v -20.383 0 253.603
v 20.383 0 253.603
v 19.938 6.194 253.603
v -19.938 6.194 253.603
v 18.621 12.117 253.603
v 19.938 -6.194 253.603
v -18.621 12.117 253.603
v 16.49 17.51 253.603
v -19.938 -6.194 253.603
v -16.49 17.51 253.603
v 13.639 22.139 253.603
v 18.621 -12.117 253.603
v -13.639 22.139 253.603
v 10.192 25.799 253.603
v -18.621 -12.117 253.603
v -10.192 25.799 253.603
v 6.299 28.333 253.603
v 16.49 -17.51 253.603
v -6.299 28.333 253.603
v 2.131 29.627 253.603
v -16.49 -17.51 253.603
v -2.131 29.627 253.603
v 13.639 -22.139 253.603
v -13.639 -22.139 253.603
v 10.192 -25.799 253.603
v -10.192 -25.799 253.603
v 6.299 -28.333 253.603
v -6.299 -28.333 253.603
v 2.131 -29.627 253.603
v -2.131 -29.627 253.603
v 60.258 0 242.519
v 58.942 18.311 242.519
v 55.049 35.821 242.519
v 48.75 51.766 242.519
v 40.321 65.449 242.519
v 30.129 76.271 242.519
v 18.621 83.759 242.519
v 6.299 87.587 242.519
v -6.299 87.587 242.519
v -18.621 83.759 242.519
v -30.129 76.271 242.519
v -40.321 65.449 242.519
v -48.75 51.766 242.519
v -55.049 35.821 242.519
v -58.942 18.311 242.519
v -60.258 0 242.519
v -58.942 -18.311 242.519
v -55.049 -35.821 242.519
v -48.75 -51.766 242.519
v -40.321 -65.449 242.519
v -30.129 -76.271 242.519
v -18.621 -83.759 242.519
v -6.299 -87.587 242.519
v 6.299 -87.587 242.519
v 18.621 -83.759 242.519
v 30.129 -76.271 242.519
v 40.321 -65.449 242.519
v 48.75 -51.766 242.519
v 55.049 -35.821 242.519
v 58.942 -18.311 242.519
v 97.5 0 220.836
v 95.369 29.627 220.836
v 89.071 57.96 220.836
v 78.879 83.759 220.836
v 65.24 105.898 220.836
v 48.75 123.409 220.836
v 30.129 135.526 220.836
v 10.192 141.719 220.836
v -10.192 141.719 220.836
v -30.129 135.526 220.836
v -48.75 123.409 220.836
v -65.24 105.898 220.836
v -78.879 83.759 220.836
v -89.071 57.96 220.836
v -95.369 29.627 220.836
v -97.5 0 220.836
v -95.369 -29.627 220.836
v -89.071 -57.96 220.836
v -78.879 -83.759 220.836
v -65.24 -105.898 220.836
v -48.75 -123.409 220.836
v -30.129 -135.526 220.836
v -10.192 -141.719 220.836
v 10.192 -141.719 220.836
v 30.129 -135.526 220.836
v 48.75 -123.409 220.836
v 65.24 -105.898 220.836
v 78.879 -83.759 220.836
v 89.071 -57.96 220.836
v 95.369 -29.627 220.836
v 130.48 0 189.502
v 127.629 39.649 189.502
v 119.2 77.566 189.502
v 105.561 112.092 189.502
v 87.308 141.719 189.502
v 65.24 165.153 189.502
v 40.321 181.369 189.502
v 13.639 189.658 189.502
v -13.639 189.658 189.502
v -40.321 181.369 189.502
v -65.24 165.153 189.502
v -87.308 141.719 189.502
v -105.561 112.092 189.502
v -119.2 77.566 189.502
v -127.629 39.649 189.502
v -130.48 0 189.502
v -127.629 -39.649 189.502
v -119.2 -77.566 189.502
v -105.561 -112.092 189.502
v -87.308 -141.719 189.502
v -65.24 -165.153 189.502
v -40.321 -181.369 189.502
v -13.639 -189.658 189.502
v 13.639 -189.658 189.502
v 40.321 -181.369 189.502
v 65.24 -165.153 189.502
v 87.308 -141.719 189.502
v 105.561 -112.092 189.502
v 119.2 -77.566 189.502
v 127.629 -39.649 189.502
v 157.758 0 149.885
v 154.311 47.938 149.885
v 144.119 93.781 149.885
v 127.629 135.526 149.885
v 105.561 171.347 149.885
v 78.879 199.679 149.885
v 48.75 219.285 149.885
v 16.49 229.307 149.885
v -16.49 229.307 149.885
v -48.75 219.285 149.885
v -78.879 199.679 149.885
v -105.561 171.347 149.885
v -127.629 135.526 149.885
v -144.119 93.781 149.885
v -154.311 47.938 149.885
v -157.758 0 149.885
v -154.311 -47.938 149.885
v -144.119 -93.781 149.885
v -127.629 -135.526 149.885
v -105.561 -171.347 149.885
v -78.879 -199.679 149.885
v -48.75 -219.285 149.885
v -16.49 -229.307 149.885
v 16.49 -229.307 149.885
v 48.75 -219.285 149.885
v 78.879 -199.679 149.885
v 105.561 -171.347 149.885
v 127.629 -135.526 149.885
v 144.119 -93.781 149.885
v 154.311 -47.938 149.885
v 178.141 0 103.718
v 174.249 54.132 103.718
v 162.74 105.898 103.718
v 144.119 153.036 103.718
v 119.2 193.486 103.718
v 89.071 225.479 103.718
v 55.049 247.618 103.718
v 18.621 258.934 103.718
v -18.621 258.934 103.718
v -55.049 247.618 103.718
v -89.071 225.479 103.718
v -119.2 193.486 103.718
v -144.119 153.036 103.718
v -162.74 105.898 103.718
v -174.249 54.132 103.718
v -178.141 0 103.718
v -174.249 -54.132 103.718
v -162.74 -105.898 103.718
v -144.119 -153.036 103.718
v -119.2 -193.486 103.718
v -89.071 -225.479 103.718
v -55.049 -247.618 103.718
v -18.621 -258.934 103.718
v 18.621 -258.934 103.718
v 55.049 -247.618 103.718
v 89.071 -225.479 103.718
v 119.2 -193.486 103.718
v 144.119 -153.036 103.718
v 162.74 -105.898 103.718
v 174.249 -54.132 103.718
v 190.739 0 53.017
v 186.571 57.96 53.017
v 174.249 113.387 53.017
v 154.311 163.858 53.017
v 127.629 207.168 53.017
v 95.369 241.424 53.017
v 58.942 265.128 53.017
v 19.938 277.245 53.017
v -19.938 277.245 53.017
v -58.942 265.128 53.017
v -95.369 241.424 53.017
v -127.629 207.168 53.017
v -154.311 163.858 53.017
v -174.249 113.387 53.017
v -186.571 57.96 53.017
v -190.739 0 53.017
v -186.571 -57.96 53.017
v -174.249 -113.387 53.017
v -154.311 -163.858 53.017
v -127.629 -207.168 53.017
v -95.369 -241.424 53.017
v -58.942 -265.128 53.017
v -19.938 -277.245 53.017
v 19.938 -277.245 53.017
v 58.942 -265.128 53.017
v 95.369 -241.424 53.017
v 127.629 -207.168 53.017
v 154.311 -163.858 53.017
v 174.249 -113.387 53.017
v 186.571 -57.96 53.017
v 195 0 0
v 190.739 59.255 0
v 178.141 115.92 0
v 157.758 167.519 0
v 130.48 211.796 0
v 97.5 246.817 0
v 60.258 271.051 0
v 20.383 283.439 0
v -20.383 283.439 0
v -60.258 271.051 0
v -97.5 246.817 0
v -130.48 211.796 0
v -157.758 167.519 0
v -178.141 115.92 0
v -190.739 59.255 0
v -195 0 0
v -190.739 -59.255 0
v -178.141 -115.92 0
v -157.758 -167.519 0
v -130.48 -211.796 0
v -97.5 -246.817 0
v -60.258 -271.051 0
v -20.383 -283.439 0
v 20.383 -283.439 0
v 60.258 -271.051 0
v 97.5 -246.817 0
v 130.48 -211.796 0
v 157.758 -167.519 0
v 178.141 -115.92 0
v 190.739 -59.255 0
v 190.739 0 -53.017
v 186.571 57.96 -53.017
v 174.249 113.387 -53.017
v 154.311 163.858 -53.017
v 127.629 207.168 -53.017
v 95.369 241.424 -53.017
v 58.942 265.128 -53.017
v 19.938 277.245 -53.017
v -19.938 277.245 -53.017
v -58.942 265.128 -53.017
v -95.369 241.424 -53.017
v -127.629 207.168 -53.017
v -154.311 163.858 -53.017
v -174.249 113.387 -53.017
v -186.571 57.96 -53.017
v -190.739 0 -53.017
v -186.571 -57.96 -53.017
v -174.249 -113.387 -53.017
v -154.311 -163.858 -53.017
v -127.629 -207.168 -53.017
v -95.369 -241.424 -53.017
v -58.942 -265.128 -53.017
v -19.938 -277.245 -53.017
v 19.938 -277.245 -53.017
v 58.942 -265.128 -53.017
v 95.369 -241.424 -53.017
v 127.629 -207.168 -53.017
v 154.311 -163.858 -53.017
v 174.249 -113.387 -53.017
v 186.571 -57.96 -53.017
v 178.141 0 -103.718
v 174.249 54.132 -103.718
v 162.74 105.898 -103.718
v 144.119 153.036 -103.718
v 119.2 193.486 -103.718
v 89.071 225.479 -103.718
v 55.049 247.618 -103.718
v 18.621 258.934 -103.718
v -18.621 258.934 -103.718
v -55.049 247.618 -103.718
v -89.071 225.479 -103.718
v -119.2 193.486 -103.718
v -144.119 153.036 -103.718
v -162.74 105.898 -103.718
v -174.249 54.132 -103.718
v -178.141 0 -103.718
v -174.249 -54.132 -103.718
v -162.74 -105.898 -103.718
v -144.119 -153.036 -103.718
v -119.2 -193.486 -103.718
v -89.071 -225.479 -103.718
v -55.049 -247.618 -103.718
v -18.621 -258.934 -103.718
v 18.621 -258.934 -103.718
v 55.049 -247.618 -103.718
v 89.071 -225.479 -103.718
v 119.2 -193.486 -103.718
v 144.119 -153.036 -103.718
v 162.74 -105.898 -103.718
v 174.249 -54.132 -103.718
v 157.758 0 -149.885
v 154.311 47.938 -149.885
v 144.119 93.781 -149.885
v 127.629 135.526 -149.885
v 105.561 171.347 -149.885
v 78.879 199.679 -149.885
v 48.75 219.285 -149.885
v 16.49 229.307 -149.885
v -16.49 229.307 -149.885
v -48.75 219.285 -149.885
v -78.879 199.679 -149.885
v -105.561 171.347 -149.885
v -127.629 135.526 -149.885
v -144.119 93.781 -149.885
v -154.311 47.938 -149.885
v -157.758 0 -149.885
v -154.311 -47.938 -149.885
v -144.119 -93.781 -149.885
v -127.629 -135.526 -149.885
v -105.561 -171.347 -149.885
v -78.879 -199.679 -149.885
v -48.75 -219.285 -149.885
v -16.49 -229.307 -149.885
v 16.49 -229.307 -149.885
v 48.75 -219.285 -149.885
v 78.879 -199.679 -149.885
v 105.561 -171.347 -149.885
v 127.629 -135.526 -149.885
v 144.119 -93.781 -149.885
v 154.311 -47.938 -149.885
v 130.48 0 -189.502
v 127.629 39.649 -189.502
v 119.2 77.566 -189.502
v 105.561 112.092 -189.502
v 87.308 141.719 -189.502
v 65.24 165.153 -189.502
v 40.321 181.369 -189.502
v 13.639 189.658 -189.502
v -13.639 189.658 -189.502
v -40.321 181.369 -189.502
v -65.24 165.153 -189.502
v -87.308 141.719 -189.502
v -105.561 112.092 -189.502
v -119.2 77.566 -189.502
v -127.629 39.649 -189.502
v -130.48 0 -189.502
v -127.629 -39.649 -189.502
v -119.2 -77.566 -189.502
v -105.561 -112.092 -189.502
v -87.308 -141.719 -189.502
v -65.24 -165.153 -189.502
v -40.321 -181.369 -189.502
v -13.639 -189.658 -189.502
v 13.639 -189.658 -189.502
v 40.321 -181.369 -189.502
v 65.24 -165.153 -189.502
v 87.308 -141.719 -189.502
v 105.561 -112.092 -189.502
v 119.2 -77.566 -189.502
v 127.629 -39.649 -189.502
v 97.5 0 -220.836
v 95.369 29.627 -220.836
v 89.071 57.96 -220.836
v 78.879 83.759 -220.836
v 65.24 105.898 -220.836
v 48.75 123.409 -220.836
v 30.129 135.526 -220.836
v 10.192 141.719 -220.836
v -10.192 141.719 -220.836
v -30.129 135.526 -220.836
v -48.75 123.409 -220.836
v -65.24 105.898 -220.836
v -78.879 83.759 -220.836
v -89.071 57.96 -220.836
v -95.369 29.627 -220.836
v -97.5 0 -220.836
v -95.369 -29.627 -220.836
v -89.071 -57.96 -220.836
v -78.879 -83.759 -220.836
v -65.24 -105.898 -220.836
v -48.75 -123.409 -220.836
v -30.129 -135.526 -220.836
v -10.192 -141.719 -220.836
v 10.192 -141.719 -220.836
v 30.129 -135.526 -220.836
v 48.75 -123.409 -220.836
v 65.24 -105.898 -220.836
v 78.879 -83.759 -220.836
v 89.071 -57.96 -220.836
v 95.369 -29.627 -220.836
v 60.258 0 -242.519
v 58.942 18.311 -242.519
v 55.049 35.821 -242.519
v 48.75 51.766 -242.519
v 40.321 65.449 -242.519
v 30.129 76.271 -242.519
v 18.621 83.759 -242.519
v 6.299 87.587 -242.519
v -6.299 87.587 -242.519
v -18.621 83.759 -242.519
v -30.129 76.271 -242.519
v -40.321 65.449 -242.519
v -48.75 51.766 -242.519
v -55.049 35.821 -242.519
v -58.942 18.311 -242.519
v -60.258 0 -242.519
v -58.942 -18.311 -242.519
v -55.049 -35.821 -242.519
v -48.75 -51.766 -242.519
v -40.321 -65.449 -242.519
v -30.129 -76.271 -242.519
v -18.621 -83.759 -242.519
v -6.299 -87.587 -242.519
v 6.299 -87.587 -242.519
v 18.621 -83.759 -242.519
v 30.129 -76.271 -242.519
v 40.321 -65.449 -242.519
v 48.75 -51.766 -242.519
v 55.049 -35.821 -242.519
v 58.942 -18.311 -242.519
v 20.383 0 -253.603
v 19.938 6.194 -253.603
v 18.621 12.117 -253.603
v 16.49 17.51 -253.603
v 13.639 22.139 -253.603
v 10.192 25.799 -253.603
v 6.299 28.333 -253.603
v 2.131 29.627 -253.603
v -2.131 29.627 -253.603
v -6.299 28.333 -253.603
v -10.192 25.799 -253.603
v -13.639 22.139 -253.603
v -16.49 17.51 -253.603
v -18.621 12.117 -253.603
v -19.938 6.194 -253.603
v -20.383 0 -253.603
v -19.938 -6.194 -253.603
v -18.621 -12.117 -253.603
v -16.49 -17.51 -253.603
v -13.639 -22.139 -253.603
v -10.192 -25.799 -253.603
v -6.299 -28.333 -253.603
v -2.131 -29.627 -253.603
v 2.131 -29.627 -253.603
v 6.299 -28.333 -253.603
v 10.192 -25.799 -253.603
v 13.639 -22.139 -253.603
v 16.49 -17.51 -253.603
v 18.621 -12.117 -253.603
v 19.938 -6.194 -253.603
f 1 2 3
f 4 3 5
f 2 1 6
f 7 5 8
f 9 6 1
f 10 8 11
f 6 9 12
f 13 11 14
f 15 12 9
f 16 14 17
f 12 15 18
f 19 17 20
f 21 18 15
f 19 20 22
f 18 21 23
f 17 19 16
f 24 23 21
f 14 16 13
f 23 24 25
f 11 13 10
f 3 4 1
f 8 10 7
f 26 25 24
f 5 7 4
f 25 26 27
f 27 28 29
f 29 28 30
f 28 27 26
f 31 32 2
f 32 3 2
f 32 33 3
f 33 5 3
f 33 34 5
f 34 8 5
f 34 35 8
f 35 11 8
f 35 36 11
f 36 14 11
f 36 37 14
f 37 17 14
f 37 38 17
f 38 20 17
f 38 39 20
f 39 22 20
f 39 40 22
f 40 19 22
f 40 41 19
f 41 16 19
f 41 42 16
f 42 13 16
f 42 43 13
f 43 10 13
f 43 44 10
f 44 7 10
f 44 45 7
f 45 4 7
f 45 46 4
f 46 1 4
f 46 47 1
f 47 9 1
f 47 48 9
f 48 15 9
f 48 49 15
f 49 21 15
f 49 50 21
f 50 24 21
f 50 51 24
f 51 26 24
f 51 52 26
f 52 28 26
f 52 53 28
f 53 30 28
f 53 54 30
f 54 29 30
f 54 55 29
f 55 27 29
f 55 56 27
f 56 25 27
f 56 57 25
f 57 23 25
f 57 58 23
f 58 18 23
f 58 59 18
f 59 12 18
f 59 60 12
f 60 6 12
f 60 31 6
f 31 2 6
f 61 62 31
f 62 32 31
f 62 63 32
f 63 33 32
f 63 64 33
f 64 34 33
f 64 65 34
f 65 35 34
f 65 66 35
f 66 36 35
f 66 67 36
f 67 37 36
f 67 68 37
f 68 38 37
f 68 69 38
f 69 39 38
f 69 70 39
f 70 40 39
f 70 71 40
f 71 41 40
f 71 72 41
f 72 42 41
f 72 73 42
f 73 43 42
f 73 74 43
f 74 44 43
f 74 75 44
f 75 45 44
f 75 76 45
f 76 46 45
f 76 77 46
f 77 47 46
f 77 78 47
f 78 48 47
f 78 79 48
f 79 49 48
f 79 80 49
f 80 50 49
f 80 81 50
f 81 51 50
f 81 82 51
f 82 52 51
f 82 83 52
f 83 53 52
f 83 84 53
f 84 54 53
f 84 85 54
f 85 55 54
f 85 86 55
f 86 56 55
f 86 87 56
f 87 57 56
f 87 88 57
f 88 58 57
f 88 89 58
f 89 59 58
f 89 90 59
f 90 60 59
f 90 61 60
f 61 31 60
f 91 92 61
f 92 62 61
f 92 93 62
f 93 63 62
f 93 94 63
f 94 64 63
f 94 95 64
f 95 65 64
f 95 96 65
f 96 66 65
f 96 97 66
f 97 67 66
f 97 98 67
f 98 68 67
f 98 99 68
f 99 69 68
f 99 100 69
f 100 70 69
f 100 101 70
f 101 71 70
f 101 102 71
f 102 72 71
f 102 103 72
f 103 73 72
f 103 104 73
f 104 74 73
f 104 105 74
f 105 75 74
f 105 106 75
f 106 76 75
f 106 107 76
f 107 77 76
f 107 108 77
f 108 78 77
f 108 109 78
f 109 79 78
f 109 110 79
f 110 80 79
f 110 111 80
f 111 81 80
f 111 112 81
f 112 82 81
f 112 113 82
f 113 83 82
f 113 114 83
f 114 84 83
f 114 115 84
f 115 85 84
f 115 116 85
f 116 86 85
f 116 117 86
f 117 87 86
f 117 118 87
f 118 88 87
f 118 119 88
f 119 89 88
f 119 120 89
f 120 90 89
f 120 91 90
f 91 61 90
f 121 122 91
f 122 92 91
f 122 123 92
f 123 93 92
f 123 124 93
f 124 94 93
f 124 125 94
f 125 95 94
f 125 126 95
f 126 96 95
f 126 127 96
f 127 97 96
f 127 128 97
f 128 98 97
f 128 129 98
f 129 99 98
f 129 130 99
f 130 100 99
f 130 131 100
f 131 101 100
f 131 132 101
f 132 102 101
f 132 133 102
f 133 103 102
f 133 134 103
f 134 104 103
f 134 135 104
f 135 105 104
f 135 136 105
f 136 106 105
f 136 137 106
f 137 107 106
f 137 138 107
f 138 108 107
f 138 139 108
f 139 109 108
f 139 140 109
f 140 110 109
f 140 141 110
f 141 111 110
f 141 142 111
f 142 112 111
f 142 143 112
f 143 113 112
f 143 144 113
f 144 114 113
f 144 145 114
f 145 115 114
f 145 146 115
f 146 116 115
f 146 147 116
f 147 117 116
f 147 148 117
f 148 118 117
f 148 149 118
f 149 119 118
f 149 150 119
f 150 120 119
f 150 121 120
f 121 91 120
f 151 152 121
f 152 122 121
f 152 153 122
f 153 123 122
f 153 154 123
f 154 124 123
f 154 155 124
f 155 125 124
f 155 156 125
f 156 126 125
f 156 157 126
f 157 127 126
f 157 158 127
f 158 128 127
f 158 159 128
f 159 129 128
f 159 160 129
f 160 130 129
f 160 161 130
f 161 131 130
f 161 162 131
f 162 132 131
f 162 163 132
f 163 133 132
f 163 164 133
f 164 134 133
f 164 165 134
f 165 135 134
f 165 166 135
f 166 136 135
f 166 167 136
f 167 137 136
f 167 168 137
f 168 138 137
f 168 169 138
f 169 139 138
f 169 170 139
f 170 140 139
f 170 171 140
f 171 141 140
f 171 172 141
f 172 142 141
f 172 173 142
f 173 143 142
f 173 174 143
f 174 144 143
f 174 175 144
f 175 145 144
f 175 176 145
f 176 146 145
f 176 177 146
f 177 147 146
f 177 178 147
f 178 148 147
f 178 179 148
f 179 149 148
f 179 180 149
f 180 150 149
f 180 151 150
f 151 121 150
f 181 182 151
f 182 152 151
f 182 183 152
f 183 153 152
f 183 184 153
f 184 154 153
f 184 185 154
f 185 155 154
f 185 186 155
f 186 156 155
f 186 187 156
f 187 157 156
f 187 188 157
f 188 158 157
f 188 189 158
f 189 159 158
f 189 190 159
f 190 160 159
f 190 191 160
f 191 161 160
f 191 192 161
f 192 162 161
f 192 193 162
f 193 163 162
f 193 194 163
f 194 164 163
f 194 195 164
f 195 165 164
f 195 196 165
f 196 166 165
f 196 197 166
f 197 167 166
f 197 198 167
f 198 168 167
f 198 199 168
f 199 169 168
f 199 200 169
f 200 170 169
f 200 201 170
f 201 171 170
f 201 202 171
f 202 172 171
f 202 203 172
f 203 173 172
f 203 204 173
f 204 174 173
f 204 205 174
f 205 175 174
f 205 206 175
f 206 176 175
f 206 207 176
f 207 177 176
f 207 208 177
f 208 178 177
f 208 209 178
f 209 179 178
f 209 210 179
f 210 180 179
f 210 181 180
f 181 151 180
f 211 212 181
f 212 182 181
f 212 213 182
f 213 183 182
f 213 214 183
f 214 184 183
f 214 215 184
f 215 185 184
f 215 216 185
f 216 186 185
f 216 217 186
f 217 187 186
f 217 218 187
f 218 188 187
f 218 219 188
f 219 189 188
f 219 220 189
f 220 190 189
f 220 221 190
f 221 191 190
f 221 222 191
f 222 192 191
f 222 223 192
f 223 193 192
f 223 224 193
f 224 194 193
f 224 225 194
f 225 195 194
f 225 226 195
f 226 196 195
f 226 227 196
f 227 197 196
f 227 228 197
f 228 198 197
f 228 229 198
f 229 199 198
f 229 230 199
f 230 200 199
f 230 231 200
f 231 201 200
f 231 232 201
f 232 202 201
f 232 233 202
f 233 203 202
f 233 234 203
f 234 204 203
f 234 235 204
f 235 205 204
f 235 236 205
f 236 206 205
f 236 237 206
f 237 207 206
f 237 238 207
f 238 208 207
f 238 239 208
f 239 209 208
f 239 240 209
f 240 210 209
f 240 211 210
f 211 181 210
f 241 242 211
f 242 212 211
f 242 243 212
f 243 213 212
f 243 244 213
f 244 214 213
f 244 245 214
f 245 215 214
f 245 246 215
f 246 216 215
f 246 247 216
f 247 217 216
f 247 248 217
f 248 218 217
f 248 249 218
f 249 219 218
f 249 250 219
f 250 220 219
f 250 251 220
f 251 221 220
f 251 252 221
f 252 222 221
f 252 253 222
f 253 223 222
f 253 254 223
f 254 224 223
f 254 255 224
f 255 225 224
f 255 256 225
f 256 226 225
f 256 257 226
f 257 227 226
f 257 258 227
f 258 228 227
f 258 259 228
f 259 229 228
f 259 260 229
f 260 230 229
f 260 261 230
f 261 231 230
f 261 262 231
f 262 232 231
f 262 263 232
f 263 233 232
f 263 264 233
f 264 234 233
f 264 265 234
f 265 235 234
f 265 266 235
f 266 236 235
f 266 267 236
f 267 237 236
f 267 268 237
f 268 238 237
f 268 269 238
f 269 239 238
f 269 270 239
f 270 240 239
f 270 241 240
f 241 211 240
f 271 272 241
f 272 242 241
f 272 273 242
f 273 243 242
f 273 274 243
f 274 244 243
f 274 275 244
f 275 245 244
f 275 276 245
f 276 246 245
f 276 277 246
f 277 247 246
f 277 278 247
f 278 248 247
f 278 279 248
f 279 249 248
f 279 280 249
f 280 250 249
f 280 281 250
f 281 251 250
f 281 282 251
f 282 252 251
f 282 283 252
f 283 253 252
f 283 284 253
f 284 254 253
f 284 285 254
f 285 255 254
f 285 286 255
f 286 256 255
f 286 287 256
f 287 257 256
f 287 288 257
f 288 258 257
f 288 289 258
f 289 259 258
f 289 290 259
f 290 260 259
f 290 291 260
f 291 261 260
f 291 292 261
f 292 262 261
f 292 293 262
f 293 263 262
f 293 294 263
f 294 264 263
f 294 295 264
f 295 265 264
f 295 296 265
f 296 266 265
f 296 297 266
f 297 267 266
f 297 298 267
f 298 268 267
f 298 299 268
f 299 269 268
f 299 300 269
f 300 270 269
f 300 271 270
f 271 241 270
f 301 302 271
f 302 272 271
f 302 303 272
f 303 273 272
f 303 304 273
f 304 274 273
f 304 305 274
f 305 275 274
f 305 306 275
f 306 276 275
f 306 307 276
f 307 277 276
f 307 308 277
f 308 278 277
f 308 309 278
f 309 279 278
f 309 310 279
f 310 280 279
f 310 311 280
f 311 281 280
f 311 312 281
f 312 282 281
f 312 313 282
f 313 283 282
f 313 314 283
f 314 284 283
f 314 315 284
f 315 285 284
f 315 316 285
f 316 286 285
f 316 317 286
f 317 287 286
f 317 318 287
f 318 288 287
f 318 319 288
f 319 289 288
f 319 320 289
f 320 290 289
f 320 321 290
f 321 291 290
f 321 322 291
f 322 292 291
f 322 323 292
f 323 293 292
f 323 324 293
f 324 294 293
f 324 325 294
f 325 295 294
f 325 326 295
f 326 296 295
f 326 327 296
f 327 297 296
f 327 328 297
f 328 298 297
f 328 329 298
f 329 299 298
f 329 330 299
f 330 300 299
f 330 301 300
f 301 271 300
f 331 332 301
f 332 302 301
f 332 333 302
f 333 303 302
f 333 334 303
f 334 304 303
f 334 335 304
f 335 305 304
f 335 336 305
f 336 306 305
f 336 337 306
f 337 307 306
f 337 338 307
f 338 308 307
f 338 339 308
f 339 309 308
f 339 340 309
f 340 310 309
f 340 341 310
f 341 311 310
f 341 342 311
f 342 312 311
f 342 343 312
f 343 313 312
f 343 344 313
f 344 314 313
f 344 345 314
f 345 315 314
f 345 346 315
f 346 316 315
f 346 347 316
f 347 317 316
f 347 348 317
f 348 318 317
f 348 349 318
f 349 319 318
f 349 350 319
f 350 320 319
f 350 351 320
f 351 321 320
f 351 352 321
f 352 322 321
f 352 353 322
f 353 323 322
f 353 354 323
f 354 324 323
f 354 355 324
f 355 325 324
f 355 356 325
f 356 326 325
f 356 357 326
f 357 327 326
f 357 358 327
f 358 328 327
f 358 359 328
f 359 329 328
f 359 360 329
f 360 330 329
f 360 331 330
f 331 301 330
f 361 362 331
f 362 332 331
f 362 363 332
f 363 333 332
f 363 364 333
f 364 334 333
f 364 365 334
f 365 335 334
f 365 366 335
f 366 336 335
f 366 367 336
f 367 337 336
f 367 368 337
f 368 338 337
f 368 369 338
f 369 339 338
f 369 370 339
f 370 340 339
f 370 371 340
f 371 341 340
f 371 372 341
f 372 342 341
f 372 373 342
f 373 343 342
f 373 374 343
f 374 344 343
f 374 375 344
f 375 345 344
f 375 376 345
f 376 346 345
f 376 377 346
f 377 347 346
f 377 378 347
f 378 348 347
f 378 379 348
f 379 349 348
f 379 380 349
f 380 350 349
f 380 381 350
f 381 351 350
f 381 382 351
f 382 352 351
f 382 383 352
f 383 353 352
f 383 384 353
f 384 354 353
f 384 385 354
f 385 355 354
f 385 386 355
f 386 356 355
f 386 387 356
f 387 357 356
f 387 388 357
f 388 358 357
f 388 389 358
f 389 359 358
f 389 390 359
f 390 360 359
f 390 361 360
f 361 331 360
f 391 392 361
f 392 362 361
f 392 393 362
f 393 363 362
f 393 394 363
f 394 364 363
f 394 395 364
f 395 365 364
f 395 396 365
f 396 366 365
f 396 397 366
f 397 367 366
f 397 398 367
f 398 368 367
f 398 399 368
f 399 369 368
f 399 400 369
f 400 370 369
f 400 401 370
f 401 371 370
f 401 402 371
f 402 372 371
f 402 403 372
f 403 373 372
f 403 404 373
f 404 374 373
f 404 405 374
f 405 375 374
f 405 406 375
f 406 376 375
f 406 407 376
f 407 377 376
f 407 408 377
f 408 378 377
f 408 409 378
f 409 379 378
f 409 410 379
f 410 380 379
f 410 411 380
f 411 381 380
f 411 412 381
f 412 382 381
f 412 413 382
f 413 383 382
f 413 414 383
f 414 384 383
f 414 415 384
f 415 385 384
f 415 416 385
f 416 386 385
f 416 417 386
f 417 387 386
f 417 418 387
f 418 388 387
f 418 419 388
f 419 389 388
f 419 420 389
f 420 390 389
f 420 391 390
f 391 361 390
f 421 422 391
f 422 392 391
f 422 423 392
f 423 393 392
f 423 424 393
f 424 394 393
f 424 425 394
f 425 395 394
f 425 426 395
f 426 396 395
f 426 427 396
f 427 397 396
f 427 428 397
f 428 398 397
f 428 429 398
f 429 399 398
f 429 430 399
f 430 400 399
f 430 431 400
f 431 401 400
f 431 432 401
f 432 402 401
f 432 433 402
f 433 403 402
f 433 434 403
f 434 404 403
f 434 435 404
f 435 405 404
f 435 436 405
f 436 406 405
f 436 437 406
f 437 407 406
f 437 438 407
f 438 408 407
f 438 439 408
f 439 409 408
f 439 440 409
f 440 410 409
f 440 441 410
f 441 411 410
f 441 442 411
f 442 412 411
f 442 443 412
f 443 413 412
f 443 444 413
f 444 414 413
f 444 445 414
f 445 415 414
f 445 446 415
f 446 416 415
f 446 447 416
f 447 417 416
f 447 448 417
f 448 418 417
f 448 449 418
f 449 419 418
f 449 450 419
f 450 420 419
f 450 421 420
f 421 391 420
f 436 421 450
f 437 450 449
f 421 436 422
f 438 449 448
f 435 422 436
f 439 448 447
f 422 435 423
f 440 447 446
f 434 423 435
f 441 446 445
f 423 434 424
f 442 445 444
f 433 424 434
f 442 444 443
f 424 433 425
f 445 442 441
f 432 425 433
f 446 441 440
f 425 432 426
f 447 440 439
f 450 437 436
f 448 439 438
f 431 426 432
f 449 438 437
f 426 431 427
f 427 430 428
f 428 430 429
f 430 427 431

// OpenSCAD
// Generated by SolidPython 1.0.1 on 2020-07-29 00:46:51


scale(v = [13, 19, 17]) {
	sphere(r = 15);
}
/***********************************************
*********      SolidPython code:      **********
************************************************
 
# import packages: SolidPython
from solid import *
from solid.utils import *
from itertools import chain, combinations, permutations


class Resize:

    def __init__(self, scad_file):
        self.scad_file = scad_file
        #self.scad_file = import_scad(scad_file)
        # cone/cylinder param:
        self.r1 = 0
        self.r2 = 0
        self.h = 0
        # rectangular prism param:
        self.w = 0
        self.l = 0
        # ellipse param:
        self.r = 0

    # import OpenScad code (file name corresponds to shape)


    # classify shape + parameters
    def assign(self, param1, param2, param3):
        if self.scad_file == 'cone.scad':
            self.r1 = param1
            self.r2 = param2
            self.h = param3
        elif self.scad_file == 'cylinder.scad':
            self.r1 = param1
            self.r2 = param2
            self.h = param3
        elif self.scad_file == 'rectangularPrism.scad':
            self.h = param1
            self.l = param2
            self.w = param3
        else:
            self.r = param1
            self.h = param2

    # resize parameters
    def iterate(self):
        x = range(3, 20, 2)
        i = 1
        if self.scad_file == 'cone.scad':
            tempList = list(permutations(x, 2))
            for temp in tempList:
                param1 = temp[0]
                param2 = temp[1]
                filepath = 'produced_scad_files/' + 'cone' + str(param1) + '_' + str(param2) + '_' + '.scad'
                scad_render_to_file(cylinder(h=param1, r1=param2, r2=0), filepath)

        elif self.scad_file == 'cylinder.scad':
            tempList = list(permutations(x, 3))
            for temp in tempList:
                param1 = temp[0]
                param2 = temp[1]
                filepath = 'produced_scad_files/' + 'cylinder' + str(param1) + '_' + str(param2) + '_' + '.scad'
                scad_render_to_file(cylinder(h=param1, r1=param2, r2=param2), filepath)

        elif self.scad_file == 'rectangularPrism.scad':
            tempList = list(permutations(x, 3))
            for temp in tempList:
                param1 = temp[0]
                param2 = temp[1]
                param3 = temp[2]
                filepath = 'produced_scad_files/' + 'rectangularPrism' + str(param1) + '_' + str(param2) + '_' + str(
                    param3) + '.scad'
                scad_render_to_file(cube(size=(param1, param2, param3)), filepath)

        elif self.scad_file == 'ellipse.scad':
            tempList = list(permutations(x, 4))
            for temp in tempList:
                param1 = temp[0]
                param2 = temp[1]
                param3 = temp[2]
                param4 = temp[3]
                filepath = 'produced_scad_files/' + 'ellipse' + str(param1) + '_' + str(param2) + '_' + str(param3) + '_' + str(param4) + '.scad'
                scad_render_to_file(scale([param1, param2, param3])(sphere(r=param4)), filepath)

    def render_to_scadfile(self):
        scad_render_to_file(scad, 'example.scad') 
 
************************************************/
